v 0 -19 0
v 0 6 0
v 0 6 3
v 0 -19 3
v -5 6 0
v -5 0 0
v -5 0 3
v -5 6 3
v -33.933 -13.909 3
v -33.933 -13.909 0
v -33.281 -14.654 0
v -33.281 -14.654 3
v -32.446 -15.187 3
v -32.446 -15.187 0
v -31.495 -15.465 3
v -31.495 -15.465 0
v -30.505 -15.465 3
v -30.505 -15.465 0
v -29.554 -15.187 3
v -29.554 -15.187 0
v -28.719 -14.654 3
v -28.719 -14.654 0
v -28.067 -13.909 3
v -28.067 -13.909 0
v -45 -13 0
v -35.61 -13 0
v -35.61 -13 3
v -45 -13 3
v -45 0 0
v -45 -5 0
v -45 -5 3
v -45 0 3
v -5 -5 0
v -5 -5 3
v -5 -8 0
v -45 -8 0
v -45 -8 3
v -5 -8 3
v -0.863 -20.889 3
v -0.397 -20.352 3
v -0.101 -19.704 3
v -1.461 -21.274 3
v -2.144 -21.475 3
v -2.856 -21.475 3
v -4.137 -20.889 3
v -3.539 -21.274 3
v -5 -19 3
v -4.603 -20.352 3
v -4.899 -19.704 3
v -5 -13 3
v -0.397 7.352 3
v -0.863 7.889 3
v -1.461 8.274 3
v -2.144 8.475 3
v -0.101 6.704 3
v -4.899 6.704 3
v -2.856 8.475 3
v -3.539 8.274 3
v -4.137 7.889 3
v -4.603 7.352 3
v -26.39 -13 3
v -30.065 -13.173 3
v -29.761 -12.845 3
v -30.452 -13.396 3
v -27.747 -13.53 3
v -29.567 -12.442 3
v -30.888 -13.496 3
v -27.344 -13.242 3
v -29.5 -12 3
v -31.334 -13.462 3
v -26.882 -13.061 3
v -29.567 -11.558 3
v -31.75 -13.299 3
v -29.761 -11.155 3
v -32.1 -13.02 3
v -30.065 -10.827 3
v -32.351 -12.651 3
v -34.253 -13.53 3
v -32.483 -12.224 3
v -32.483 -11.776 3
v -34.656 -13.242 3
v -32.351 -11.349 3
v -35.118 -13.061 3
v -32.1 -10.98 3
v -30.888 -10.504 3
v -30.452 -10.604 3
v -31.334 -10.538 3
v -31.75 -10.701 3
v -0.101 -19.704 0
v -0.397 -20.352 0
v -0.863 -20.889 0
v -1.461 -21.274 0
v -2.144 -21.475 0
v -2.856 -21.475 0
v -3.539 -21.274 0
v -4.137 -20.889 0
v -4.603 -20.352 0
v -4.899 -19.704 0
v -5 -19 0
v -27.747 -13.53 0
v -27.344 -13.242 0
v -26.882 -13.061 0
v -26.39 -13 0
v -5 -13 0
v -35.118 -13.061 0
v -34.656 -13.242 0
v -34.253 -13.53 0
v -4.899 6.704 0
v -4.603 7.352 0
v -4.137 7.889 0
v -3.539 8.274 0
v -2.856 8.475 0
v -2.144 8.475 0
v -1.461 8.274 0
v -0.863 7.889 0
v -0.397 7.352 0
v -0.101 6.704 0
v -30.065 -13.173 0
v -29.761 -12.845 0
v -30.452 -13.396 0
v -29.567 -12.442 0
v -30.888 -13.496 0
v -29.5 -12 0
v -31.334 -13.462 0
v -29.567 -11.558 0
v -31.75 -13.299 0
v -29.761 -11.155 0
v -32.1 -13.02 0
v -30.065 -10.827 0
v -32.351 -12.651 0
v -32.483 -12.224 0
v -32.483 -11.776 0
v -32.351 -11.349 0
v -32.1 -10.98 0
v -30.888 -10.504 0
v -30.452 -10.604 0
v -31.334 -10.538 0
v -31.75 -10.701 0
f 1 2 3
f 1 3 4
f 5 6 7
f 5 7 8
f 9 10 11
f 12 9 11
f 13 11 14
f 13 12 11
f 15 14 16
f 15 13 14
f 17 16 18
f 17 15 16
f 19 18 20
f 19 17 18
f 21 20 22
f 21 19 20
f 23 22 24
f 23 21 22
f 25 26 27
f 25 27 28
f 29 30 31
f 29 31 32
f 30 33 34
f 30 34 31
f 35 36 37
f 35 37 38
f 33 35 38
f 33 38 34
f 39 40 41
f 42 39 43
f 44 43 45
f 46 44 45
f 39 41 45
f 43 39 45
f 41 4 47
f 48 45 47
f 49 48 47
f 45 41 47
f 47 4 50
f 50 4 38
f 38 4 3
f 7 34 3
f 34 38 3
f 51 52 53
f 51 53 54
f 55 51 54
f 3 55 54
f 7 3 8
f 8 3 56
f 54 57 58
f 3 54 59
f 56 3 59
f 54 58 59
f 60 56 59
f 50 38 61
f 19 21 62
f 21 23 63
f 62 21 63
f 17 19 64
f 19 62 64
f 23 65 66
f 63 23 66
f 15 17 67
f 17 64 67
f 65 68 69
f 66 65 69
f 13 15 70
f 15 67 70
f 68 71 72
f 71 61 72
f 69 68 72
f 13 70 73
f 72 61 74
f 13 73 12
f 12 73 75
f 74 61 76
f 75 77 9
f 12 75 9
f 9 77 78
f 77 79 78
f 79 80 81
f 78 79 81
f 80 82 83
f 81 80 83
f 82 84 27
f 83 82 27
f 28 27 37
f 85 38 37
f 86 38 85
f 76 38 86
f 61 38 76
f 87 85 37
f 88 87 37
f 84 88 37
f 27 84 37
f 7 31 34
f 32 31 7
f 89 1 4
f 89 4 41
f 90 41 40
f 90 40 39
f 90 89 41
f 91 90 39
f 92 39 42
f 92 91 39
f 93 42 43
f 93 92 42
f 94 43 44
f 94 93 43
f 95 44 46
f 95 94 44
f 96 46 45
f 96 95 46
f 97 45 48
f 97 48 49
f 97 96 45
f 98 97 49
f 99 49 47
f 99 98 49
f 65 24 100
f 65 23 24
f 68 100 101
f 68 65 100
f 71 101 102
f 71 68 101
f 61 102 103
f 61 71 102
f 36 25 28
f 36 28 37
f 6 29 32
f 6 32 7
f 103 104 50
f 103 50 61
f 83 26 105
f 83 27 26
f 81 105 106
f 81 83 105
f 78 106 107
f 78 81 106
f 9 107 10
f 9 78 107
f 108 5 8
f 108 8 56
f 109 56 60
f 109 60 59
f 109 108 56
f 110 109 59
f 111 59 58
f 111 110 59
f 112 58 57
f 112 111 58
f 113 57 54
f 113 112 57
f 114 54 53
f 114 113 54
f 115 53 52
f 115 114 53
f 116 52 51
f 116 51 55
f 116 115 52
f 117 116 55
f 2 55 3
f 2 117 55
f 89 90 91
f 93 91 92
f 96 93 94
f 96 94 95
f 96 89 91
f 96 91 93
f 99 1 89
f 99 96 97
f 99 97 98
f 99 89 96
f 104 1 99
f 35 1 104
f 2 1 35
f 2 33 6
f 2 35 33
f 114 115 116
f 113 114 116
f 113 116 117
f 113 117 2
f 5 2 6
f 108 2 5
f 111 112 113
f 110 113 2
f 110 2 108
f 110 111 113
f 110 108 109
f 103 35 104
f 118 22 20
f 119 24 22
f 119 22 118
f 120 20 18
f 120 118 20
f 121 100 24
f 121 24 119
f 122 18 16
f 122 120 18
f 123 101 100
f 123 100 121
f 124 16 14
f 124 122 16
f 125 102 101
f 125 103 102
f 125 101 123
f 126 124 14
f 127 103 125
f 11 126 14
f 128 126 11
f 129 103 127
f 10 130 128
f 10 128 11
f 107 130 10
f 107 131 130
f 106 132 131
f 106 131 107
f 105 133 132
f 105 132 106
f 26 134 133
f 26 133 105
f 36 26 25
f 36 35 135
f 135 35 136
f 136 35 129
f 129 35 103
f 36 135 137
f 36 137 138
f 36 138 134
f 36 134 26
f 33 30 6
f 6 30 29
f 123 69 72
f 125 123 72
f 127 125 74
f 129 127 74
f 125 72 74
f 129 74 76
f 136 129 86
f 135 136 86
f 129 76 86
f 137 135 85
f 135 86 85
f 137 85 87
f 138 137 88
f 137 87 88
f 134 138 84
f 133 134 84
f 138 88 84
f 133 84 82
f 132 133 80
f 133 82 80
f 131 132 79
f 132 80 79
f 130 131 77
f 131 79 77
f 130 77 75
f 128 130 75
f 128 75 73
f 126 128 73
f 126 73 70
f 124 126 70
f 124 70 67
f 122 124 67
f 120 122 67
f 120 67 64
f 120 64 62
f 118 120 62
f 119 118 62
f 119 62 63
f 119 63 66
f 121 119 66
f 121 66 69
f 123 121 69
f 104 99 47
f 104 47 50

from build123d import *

# Parameters (mm, degrees)
EXTRUDE_1_DEPTH     = 3
SKETCH_2_R          = 3.5
EXTRUDE_2_DEPTH     = 3
SKETCH_3_R          = 1.5
CUT_EXTRUDE_1_DEPTH = 48.689097286
EXTRUDE_3_DEPTH     = 3
FILLET_1_R          = 2


with BuildPart() as part:
    # 草图1 → 凸台-拉伸1 (new body)
    with BuildSketch(Plane.XY):
        Polygon((-45, 0), (0, 0), (0, -13), (-45, -13), (-45, -8), (-5, -8), (-5, -5), (-45, -5), align=None)
    extrude(amount=EXTRUDE_1_DEPTH)

    # 草图2 → 凸台-拉伸2 (add)
    with BuildSketch(Plane.XY.offset(3)):
        with Locations((-31, -12)):
            Circle(SKETCH_2_R)
    extrude(amount=-EXTRUDE_2_DEPTH)

    # 草图3 → 切除-拉伸1 (cut, through all)
    with BuildSketch(Plane.XY.offset(3)):
        with Locations((-31, -12)):
            Circle(SKETCH_3_R)
    extrude(amount=-CUT_EXTRUDE_1_DEPTH, mode=Mode.SUBTRACT)

    # 草图4 → 凸台-拉伸3 (add)
    with BuildSketch(Plane.XY):
        with BuildLine():
            Line((0, 6), (0, -19))
            ThreePointArc((0, -19), (-2.5, -21.5), (-5, -19))
            Line((-5, -19), (-5, 6))
            ThreePointArc((-5, 6), (-2.5, 8.5), (0, 6))
        make_face()
    extrude(amount=EXTRUDE_3_DEPTH)

    # 圆角1
    fillet_1_edges = [part.edges().sort_by_distance(p)[0] for p in [
        (-34.354101966, -13, 1.5),
        (-27.645898034, -13, 1.5),
    ]]
    fillet(fillet_1_edges, radius=FILLET_1_R)


solid = part.part
